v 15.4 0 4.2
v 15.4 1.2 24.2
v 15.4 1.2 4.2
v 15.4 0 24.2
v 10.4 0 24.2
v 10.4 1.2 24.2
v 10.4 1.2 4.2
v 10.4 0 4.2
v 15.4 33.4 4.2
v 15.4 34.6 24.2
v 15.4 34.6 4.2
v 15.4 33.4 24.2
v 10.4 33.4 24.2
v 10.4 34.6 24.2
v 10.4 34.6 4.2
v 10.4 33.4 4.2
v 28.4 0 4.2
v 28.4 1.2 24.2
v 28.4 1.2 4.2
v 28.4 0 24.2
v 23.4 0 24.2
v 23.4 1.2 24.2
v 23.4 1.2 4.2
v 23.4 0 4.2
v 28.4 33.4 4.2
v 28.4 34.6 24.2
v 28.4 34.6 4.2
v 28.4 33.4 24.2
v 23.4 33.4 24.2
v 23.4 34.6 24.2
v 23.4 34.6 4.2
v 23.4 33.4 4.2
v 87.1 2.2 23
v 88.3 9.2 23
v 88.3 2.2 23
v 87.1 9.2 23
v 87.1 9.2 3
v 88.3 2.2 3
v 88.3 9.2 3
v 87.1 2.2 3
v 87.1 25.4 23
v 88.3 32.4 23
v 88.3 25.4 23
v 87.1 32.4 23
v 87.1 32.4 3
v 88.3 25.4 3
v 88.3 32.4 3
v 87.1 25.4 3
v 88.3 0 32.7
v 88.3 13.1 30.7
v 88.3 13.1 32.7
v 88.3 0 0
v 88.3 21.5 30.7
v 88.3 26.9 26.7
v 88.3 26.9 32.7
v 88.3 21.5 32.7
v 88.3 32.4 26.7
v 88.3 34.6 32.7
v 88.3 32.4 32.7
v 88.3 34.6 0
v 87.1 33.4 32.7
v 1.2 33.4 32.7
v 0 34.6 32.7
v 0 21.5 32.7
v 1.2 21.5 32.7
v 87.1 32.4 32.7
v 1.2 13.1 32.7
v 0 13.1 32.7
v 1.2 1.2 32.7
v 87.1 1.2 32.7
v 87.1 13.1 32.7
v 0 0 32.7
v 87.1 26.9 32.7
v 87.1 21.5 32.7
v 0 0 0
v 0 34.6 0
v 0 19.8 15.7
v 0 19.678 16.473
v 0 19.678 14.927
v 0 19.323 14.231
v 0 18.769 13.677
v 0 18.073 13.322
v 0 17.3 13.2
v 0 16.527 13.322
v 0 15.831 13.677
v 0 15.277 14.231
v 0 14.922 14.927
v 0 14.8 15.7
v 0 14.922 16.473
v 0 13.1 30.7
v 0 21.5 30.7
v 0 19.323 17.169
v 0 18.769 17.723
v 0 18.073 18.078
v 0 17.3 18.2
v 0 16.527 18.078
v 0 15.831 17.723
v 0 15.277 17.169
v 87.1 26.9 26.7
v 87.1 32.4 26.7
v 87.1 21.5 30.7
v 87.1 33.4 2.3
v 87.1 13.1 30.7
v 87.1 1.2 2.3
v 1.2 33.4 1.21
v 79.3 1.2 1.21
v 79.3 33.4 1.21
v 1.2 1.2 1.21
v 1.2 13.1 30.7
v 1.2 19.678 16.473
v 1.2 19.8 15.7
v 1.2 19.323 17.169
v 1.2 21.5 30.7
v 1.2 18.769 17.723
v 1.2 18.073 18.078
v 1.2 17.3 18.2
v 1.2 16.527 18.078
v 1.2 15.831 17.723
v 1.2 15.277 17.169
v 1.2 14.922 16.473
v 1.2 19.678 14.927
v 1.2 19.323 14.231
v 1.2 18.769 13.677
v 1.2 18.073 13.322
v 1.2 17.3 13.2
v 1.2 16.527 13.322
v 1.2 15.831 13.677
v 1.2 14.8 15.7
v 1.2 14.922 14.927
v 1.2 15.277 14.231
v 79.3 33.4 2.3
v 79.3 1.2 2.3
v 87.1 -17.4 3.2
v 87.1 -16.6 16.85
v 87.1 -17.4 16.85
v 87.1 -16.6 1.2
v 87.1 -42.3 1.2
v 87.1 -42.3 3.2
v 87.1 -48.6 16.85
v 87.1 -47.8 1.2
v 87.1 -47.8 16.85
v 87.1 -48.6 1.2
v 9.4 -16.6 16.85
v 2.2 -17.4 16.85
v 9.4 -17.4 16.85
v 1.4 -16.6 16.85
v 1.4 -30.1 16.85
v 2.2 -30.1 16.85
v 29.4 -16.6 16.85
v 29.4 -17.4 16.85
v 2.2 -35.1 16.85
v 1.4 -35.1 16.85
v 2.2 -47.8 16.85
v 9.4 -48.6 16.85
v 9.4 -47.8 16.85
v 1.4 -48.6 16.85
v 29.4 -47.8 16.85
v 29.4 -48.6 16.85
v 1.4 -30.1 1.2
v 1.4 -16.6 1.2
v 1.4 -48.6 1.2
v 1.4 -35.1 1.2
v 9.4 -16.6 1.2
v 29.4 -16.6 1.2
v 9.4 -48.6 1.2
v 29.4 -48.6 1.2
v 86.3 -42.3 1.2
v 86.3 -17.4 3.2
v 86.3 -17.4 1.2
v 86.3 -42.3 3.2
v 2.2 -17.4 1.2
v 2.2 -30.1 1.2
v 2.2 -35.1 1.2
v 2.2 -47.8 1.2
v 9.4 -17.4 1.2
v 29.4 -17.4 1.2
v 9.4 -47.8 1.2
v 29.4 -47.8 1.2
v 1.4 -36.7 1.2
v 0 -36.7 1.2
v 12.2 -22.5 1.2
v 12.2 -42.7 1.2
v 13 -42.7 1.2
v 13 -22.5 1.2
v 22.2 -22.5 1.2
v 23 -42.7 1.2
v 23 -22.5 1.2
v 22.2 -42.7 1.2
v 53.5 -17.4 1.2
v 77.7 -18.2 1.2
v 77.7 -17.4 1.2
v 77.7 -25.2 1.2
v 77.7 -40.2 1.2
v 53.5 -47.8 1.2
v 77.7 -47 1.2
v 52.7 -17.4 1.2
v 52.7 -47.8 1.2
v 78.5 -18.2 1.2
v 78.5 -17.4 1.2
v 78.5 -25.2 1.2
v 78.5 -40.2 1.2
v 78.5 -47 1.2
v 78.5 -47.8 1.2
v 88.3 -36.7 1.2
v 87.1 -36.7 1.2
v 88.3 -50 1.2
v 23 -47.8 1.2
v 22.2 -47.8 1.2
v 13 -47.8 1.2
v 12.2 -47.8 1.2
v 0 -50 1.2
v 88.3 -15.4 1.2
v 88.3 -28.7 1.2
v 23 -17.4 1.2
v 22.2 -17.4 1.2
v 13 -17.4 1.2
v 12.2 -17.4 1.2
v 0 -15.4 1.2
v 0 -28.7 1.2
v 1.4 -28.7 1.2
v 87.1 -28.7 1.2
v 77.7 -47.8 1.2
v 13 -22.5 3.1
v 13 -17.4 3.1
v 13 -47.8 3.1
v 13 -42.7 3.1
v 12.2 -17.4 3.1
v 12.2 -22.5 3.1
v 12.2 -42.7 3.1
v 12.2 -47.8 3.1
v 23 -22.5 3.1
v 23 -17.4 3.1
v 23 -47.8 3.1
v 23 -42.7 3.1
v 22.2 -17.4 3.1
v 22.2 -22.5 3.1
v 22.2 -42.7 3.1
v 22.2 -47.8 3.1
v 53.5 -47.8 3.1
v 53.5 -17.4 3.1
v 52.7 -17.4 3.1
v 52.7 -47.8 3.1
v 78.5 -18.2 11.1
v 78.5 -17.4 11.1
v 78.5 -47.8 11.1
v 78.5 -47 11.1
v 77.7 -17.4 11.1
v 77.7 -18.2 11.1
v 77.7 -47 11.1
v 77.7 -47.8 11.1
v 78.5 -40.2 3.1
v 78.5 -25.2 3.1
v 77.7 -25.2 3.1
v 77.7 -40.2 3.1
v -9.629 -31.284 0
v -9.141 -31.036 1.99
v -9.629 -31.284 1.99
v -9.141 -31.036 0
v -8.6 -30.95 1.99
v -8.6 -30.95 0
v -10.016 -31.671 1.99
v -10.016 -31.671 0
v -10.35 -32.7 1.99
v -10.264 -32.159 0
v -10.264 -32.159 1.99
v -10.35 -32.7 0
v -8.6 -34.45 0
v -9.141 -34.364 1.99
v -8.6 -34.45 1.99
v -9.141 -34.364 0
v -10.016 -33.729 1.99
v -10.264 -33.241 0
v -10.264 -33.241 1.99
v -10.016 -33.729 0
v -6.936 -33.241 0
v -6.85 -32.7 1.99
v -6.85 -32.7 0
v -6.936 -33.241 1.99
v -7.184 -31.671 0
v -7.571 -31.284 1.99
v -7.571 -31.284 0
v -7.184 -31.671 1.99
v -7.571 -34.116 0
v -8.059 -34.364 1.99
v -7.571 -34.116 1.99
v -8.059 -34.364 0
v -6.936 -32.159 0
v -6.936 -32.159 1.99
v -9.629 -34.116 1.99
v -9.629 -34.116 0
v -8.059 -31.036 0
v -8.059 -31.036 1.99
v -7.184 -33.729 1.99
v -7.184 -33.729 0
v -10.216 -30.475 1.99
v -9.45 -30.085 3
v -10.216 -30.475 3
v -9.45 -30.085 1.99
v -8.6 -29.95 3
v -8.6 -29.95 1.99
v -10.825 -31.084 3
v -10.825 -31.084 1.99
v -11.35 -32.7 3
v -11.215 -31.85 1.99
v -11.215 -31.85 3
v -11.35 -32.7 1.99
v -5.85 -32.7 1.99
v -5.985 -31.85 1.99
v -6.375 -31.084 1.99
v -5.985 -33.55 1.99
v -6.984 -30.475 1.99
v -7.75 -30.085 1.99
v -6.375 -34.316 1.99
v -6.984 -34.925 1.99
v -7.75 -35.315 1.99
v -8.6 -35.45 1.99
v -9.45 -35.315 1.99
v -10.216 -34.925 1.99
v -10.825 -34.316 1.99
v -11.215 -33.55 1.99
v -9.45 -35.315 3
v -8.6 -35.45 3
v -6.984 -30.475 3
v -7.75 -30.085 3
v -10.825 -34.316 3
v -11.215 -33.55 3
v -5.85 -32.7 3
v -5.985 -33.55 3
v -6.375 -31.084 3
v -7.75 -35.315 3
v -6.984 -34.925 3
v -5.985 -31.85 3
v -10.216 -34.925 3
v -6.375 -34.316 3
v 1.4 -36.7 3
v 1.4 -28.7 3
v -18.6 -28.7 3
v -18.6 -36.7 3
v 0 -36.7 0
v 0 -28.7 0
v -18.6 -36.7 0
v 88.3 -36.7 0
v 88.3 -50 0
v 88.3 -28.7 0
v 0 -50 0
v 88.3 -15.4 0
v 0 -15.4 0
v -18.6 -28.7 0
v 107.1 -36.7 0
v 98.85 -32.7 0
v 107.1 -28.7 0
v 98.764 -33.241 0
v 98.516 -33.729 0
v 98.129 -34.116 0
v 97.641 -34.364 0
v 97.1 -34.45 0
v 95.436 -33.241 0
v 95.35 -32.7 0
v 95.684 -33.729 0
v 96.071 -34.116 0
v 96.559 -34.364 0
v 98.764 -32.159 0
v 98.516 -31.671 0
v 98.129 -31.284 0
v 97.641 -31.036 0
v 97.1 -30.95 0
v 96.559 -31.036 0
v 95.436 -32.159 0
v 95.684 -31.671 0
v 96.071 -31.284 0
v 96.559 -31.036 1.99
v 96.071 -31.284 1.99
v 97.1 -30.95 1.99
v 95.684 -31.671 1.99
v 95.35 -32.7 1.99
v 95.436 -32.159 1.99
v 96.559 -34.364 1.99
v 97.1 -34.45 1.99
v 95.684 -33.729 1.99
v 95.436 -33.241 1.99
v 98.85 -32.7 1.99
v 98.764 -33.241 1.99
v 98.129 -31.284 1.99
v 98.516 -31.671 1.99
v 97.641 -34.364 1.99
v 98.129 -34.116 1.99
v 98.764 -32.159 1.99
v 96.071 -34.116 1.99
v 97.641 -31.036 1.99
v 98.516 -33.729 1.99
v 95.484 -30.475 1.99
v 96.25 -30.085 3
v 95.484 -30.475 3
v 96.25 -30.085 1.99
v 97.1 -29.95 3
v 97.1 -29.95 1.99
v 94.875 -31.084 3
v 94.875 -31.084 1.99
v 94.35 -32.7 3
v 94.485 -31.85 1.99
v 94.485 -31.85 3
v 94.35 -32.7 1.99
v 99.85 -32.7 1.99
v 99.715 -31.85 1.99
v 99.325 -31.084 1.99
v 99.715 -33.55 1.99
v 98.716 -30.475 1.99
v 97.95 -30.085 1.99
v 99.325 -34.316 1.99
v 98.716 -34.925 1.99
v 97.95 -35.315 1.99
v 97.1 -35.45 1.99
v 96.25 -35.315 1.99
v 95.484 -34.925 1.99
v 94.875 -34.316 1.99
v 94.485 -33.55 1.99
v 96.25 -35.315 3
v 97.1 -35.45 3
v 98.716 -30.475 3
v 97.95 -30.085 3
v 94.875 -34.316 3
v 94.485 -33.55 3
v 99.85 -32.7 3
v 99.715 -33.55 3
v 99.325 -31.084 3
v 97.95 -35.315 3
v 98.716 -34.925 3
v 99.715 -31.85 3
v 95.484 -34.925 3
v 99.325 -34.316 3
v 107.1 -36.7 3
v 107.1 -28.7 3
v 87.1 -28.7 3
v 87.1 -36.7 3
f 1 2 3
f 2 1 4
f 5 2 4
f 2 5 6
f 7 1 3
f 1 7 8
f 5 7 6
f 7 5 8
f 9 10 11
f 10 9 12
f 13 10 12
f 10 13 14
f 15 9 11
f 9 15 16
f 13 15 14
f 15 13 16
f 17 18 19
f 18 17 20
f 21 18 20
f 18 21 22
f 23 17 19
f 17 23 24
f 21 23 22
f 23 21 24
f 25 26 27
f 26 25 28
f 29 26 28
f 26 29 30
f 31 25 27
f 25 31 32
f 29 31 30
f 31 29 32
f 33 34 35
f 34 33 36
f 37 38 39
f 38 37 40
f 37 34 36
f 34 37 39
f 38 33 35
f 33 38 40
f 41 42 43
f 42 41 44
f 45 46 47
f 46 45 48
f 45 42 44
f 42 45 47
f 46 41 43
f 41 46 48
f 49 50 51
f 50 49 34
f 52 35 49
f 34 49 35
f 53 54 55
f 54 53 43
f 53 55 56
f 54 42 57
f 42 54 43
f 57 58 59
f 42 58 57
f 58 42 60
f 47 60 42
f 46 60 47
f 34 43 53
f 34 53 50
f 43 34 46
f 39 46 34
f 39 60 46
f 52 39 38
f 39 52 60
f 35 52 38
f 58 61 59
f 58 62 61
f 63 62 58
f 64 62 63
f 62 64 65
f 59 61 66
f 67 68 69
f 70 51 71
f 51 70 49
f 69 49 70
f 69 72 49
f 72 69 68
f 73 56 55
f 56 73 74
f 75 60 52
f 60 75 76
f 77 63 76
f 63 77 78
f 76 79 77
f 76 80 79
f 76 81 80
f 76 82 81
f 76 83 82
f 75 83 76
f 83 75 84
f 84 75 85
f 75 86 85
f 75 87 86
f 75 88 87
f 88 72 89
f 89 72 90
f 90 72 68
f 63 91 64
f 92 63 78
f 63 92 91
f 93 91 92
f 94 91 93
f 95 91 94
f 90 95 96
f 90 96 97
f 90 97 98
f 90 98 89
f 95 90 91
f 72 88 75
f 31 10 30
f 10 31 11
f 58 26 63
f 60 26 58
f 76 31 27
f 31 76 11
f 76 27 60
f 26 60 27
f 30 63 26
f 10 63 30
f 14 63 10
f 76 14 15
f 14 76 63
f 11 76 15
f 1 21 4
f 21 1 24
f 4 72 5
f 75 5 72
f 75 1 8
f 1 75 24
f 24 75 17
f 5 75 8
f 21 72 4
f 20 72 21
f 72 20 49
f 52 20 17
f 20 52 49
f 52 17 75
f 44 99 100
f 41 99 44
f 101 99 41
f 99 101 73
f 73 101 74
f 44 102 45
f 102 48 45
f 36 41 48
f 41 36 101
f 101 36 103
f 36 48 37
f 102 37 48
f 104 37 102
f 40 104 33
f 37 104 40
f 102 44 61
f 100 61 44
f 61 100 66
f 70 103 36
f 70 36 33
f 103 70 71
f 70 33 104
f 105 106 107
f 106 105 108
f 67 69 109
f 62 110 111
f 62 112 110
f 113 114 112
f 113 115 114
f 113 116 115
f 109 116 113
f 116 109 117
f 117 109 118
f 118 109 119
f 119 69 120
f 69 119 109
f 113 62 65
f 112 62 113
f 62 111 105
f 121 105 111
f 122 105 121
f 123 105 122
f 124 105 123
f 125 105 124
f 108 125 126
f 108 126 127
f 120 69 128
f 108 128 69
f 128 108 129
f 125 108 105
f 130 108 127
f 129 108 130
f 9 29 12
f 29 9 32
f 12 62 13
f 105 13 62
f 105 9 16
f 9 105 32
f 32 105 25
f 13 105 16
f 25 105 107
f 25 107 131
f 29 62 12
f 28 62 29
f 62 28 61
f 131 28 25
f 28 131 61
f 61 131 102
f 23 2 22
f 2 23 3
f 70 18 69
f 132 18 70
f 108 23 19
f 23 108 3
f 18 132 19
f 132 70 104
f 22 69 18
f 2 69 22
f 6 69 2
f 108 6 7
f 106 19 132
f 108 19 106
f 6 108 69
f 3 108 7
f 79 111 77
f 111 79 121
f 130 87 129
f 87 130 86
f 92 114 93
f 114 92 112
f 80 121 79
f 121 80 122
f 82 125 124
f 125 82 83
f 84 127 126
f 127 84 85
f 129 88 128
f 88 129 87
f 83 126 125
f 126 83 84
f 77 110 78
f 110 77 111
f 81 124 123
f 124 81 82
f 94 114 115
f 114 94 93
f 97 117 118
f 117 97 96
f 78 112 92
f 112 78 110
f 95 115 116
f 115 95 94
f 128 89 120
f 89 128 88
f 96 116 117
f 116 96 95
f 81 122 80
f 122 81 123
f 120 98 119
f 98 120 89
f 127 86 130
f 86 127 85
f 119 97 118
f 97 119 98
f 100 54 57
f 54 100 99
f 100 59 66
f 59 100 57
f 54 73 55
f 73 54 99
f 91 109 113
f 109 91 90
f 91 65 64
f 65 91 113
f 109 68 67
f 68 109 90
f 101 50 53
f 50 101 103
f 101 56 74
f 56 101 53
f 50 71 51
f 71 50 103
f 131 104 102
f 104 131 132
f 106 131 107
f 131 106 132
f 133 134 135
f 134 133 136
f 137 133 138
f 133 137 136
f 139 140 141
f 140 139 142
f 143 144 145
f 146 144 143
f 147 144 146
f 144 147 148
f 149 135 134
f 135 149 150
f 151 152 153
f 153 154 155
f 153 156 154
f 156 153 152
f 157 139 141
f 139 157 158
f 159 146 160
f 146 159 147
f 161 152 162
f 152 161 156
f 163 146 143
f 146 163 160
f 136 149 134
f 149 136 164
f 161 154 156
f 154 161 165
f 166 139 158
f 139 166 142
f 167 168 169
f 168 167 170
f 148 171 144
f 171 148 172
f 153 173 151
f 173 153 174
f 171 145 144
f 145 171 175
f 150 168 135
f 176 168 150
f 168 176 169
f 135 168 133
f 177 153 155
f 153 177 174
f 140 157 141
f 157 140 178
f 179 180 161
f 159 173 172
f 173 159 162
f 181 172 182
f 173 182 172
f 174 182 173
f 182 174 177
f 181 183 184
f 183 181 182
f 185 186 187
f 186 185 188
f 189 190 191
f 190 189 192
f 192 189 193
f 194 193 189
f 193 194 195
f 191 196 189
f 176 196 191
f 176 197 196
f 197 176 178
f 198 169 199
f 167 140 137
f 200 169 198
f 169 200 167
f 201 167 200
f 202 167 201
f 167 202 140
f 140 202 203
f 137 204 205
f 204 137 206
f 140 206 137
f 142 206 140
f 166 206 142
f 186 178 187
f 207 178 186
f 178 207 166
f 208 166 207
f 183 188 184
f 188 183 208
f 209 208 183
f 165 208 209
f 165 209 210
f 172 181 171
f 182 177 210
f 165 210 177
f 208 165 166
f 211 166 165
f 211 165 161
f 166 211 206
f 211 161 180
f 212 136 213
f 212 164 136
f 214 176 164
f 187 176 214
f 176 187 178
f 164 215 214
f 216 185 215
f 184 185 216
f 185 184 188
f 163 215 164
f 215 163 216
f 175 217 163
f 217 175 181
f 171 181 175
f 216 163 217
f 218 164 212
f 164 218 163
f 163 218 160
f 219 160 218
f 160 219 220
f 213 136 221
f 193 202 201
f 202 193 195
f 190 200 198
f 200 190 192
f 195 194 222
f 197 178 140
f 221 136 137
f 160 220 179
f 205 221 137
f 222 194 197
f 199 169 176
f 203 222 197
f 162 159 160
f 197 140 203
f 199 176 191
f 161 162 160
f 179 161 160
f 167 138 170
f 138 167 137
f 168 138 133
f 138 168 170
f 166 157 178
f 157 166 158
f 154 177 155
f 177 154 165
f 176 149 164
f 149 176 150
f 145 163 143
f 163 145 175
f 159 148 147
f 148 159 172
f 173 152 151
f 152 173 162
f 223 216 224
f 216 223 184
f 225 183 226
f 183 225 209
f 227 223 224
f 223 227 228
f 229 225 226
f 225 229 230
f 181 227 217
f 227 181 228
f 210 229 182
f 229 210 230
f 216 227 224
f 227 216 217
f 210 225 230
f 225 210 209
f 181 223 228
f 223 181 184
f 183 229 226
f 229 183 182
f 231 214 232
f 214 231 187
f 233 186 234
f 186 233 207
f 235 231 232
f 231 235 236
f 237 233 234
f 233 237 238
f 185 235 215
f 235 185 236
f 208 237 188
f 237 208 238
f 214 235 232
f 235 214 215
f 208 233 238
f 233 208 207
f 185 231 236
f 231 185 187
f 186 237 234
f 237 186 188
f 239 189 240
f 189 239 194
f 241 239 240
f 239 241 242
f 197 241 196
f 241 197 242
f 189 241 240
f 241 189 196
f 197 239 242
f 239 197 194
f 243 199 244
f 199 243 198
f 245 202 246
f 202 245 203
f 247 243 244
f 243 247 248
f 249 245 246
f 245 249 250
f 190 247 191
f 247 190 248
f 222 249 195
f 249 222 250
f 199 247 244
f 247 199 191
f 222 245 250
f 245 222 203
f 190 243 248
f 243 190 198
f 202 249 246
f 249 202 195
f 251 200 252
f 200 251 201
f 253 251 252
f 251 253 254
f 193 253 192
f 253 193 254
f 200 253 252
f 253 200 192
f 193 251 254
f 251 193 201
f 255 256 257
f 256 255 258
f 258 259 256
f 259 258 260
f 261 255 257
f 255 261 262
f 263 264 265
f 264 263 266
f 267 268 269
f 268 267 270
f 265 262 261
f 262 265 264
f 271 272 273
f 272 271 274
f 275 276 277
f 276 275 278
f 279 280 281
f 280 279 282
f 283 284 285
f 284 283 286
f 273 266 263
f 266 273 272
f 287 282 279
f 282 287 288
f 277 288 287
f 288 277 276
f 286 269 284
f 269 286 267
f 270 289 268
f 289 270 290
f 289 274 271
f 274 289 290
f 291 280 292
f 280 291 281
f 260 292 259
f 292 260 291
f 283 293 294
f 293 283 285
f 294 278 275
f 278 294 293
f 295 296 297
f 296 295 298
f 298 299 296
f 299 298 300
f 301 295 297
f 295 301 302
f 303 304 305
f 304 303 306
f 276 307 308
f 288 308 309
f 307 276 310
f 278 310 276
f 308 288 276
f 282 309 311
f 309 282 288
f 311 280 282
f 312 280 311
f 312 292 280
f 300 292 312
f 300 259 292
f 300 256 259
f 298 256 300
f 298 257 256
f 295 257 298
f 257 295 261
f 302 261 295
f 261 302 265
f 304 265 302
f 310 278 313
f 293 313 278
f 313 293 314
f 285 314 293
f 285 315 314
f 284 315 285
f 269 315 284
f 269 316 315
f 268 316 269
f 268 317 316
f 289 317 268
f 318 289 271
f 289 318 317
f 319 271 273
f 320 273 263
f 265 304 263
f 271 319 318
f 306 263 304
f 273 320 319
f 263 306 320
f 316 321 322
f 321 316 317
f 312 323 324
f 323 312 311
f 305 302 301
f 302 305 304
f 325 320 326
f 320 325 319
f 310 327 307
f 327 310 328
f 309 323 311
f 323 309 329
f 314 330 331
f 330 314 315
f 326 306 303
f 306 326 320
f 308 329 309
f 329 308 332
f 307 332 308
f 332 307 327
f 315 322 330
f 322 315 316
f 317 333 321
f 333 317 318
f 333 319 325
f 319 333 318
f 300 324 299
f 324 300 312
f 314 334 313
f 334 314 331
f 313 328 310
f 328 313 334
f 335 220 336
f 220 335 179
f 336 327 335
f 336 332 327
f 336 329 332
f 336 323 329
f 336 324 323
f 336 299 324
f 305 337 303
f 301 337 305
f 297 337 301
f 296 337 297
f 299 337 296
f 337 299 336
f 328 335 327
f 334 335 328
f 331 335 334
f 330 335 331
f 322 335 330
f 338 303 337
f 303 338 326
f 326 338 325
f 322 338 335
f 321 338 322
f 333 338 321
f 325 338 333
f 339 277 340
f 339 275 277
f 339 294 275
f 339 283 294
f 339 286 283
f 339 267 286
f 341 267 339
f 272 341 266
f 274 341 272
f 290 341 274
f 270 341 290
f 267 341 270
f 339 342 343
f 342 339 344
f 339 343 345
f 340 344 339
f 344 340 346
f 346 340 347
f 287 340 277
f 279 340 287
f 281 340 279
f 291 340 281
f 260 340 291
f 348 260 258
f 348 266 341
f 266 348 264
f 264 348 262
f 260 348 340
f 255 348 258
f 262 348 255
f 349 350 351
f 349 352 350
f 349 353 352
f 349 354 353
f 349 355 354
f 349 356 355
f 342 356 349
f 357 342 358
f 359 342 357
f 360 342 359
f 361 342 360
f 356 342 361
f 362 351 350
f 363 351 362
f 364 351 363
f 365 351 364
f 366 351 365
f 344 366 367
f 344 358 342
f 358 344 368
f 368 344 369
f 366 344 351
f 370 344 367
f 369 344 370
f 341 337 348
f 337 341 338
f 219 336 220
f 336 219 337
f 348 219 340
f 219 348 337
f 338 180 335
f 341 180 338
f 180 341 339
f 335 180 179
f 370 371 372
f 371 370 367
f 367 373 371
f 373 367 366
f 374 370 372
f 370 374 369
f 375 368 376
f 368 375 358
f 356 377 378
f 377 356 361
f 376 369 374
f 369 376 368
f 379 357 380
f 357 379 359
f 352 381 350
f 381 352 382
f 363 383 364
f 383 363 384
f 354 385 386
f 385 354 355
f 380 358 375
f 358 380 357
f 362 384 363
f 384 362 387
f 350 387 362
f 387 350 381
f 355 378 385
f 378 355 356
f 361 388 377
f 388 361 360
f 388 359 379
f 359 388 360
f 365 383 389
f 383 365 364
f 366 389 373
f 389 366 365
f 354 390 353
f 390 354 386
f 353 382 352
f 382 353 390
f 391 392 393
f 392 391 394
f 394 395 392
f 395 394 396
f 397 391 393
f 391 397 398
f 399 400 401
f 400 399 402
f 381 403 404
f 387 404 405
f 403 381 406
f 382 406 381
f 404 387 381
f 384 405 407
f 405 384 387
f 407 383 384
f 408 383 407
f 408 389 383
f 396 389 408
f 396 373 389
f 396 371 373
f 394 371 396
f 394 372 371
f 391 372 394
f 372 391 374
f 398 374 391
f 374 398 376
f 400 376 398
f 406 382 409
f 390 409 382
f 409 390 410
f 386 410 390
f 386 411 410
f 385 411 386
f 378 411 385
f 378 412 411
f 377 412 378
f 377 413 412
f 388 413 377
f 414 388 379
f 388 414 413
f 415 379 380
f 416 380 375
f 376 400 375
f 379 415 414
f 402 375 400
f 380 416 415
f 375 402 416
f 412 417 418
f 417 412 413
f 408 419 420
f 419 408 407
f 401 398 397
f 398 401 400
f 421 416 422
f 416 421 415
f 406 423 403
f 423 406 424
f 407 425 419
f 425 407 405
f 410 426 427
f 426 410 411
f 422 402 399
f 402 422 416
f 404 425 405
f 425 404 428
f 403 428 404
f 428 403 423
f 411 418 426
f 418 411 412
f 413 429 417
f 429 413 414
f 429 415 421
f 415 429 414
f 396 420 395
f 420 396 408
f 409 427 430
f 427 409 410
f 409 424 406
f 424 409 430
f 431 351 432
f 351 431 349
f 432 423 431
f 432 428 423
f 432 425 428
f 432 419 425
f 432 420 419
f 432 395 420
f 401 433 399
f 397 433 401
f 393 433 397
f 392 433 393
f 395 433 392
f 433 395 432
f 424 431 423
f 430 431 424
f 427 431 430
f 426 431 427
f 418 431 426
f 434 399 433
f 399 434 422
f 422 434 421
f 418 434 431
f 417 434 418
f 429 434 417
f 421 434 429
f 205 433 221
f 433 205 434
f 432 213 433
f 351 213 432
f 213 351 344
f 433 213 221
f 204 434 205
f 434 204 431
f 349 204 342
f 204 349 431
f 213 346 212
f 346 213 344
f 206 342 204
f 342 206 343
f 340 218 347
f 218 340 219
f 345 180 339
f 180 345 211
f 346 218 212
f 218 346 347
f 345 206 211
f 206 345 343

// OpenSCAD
DEBUG = false;

laser_dia = 12;
main_length = 35.8;

heatsink_size_v1 = [31.7, 20, 30.2];
laser_z_in_heatsink_v1 = 10.7;

heatsink_size_v2 = [50.5, 20.2, 31.5];
laser_z_in_heatsink_v2 = 11;


heatsink_size = heatsink_size_v2;
fan_size = [7.8, 30, 30];

fan_hole_pos = [3, 3];
fan_hole_dia = 4.5;

laser_length = 42;
laser_board_length = 10.4;
laser_z_in_heatsink = laser_z_in_heatsink_v2;
laser_pos_offset = abs(laser_length - heatsink_size.x - 10);
echo("laser_pos_offset", laser_pos_offset);
length_space = 5 + laser_pos_offset;
ray_hole_laser_dia = 5;
screw_hole_laser_dia = 3.5;
cable_hole_width = 5.5;

screwholder_size = [20, 8, 3];

partition_fatness = .8;
fatness = 1.2;
cover_side_fat = 0.8;
inset = 0.4;
round_prec = 20;

// ---

inner_height = max(fan_size.z, heatsink_size.z);
//inner_height = fan_size.z;

echo("Inner height ", inner_height);

base_inner = [laser_length + laser_board_length + length_space + fan_size.x + inset, fan_size.y + inset, fan_size.z + inset];
echo("Base inner box size ", base_inner.x, " x ", base_inner.y);

base_outer = [base_inner.x + cover_side_fat * 2, base_inner.y + cover_side_fat * 2, inner_height / 2];
echo("Base outer box size ", base_outer.x, " x ", base_outer.y);

inner_box = [base_outer.x + inset / 2, base_outer.y + inset / 2, inner_height];
echo("Inner box size ", inner_box.x, " x ", inner_box.y);

box = [inner_box.x + fatness * 2, inner_box.y + fatness * 2, inner_height + fatness];
echo("Box size ", box.x, " x ", box.y, " x ", box.z);


// ---------------------------------------------

module Heatsink(x, y, z) {
    translate([x, y, z]) union() {
        color("black") cube(heatsink_size);
    }
}

module Laser(x, y, z) {
    translate([x, y, z]) union() {
        color("gray") rotate([0, 90]) cylinder(h = laser_length, d = laser_dia, $fn = 40);
        color("gray") translate([laser_length, - laser_dia / 2, - 1]) cube([laser_board_length, laser_dia, 1]);
        color("green") translate([- 30, 0, 0]) rotate([0, 90]) cylinder(h = laser_length, d = ray_hole_laser_dia, $fn = 40);
    }
}

module Fan(x, y, z) {
    color("maroon") translate([x, y, z]) union() {
        difference() {
            cube(fan_size);
            for (r = [0:1])for (c = [0:1]) {
                translate([- .1,
                        fan_hole_pos.x + c * (fan_size.y - 2 * fan_hole_pos.x),
                        fan_hole_pos.y + r * (fan_size.z - 2 * fan_hole_pos.y)]
                ) color("yellow")  rotate([0, 90]) cylinder(h = fan_size.x + 10 + .01, d = fan_hole_dia, $fn = round_prec);
            }
        }
    }
}

module ScrewHolder(x, y) {
    color("orange") translate([x, y - screwholder_size.y / 2]) difference() {
        cube([screwholder_size.x, screwholder_size.y, screwholder_size.z]);
        translate([screwholder_size.x / 2, screwholder_size.y / 2, - .01]) rotate([0, 0, 90]) {
            cylinder(h = screwholder_size.z + 2, d = screw_hole_laser_dia, $fn = round_prec);
            translate([0, 0, screwholder_size.z - 1]) color("yellow") cylinder(h = 2, d = screw_hole_laser_dia + 2, $fn = round_prec);
        }
    }
}

// cover
//translate([0, - 15.4, fatness + box.z + .05]) rotate([180, 0, 0])
union() {
    difference() {
        cube(box);

        translate([fatness, fatness, fatness + .01])
            cube(inner_box);

        // for debugging (ceiling)
        // translate([fatness, fatness, - .01]) cube(inner_box);

        // ray hole
        translate([- 0.2, box.y / 2, box.z - laser_dia / 2 - laser_z_in_heatsink]) rotate([0, 90]) {
            cylinder(h = fatness + 0.4, d = ray_hole_laser_dia, $fn = round_prec);
        }

        // cable hole
        translate([box.x - fatness - .01, box.y - cable_hole_width - fatness - cover_side_fat - inset / 2, box.z - 6]) {
            cube([4, cable_hole_width, 100]);
        }

        // side air flow holes
        translate([fatness + 9.2, - .01, fatness + 3]) {
            for (i = [0: 1]) {
                translate([i * 13, 0, 0]) cube([5, 10, 20]);
                translate([i * 13, inner_box.y, 0]) cube([5, 10, 20]);
            }
        }

        // back air flow holes
        translate([box.x - fatness - .01, fatness, 3]) {
            width = 7;
            translate([0, 1, 0]) cube([fatness + .2, width, 20]);
            translate([0, inner_box.y - width - 1, 0]) cube([fatness + .2, width, 20]);
        }

        // screw holders space
        translate([-.01, (box.y - screwholder_size.y) / 2 - .2, box.z - screwholder_size.z + fatness - .2]) {
            cube([fatness + .02, screwholder_size.y + .4, screwholder_size.z - fatness + .4]);
        }
        translate([box.x - fatness - .01, (box.y - screwholder_size.y) / 2 - .2, box.z - screwholder_size.z + fatness - .2]) {
            cube([fatness + .02, screwholder_size.y + .4, screwholder_size.z - fatness + .4]);
        }

        // for debugging (back side)
        // translate([box.x - fatness - .01, fatness, fatness]) cube([100, inner_box.y, 100]);
    }

    // fan ceiling
    translate([box.x - fan_size.x - fatness, 0, fatness]) {
        color("orange") cube([fan_size.x, box.y, inner_height - fan_size.z - .4]);
    }
}


// base
translate([0, - 50]) union() {
    union() {
        cube([box.x, box.y, fatness]);

        difference() {
            translate([fatness + inset / 2, fatness + inset / 2, fatness - .1]) difference() {
                color("blue") cube(base_outer);

                translate([cover_side_fat, cover_side_fat, .01]) {
                    color("red") cube(base_inner);
                }
            }

            // remove back side (almost)
            translate([fatness, fatness + inset / 2]) {
                translate([base_outer.x - cover_side_fat - .01, cover_side_fat, fatness]) {
                    color("green") cube([5, cable_hole_width, 20]);
                }
                translate([base_outer.x - cover_side_fat - .01, cover_side_fat, fatness + 2]) {
                    color("red") cube([5, base_inner.y, 20]);
                }
            }

            // ray hole
            translate([fatness + inset / 2 - .01, fatness + inset / 2]) translate([0, base_outer.y / 2 - ray_hole_laser_dia / 2, fatness])
                {
                    color("green") cube([5, ray_hole_laser_dia, 20]);
                }

            // ventilation holes
            for (y = [0 : 1]) {
                translate([fatness + inset / 2 + 8, y * inner_box.y]) {
                    color("green") cube([20, ray_hole_laser_dia, 20]);
                }
            }
        }

        if (DEBUG) translate([fatness + inset / 2 + cover_side_fat, fatness + inset / 2 + cover_side_fat, fatness + inset / 2]) {
            Heatsink(0, (base_inner.y - heatsink_size.y) / 2, 0);
            Laser(laser_pos_offset, base_inner.y / 2, laser_z_in_heatsink + laser_dia / 2);
            Fan(base_inner.x - fan_size.x, inset / 2, 0);
        }


        // heatsink partitions
        color("yellow") {
            translate([fatness + inset / 2 + cover_side_fat + heatsink_size.x, fatness + inset / 2 + cover_side_fat, fatness - .1]) {
                cube([partition_fatness, base_inner.y, 2]);
            }
            for (i = [1 : 2]) {
                translate([fatness + inset / 2 + cover_side_fat + i * 10, fatness + inset / 2 + cover_side_fat, fatness - .1]) {
                    difference() {
                        cube([partition_fatness, base_inner.y, 2]);
                        /* not debug only!! */ Heatsink(- .01, (base_inner.y - heatsink_size.y) / 2, 0);
                    }
                }
            }
        }

        // fan partitions
        color("green") {
            width = 15;
            translate([fatness + inset / 2 + cover_side_fat + base_inner.x - fan_size.x - partition_fatness, (box.y - width) / 2,
                    fatness - .1]) {
                cube([partition_fatness, width, 2]);
            }

            translate([fatness + inset / 2 + cover_side_fat + base_inner.x - fan_size.x - partition_fatness, fatness + inset / 2 +
                cover_side_fat, fatness - .1]) {
                difference() {
                    s = .8;
                    cube([partition_fatness, base_inner.y, 10]);
                    translate([- .01, s, 0]) cube([5, base_inner.y - s * 2, 20]);
                }
            }
        }

        // screw holders
        ScrewHolder(- screwholder_size.x + fatness + inset / 2, box.y / 2);
        ScrewHolder(box.x - fatness, box.y / 2);
    }
}
